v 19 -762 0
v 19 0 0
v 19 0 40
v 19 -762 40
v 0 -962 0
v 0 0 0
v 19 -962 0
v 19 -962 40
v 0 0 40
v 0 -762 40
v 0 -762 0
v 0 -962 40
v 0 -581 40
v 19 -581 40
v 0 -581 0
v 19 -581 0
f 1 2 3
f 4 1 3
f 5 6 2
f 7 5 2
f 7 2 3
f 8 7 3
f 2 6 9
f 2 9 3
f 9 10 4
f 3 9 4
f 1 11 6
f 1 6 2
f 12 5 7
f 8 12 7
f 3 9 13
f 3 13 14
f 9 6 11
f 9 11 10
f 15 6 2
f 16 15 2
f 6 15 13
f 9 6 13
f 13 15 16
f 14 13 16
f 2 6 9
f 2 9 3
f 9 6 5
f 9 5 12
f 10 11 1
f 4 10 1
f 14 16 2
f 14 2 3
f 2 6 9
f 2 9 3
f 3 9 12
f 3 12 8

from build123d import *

# Parameters (mm, degrees)
F1_W     = 19
F1_H     = 40
F2_DEPTH = 762
F3_DEPTH = 581
F4_DEPTH = 962


with BuildPart() as f2:
    # F1 (on Front) → F2 (new body)
    with BuildSketch(Plane.XZ):
        with Locations((9.5, 20)):
            Rectangle(F1_W, F1_H)
    extrude(amount=F2_DEPTH)


with BuildPart() as f3:
    # F1 (on Front) → F3 (new body)
    with BuildSketch(Plane.XZ):
        with Locations((9.5, 20)):
            Rectangle(F1_W, F1_H)
    extrude(amount=F3_DEPTH)


with BuildPart() as f4:
    # F1 (on Front) → F4 (new body)
    with BuildSketch(Plane.XZ):
        with Locations((9.5, 20)):
            Rectangle(F1_W, F1_H)
    extrude(amount=F4_DEPTH)


solid = Compound([f2.part, f3.part, f4.part])
